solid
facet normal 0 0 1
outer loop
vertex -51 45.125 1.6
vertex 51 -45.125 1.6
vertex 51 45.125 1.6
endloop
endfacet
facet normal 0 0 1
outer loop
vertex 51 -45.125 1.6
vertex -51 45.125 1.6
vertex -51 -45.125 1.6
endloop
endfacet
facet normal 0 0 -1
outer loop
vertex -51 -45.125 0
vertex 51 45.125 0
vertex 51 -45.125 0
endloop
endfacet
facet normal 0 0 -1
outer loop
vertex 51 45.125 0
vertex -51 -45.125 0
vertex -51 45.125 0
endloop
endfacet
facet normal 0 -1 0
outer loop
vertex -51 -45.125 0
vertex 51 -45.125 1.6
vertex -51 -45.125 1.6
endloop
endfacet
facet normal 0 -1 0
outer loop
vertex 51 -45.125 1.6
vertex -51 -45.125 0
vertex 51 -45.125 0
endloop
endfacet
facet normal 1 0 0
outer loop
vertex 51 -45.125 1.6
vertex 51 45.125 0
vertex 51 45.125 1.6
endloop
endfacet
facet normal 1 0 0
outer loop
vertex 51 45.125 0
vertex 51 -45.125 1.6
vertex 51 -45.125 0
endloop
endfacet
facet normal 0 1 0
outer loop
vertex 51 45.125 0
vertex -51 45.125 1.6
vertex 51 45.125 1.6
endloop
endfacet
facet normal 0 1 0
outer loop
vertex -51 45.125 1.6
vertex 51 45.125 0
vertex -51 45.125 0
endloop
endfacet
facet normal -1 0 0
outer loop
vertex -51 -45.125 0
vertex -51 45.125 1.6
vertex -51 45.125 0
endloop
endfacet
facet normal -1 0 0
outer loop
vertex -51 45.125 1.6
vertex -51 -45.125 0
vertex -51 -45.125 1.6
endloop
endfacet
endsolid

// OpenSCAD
$fn = 64;

board_x = 102.0;
board_y = 90.25;
board_th = 1.6;

color([0.05, 0.45, 0.18])
translate([-board_x/2, -board_y/2, 0])
cube([board_x, board_y, board_th], center=false);
